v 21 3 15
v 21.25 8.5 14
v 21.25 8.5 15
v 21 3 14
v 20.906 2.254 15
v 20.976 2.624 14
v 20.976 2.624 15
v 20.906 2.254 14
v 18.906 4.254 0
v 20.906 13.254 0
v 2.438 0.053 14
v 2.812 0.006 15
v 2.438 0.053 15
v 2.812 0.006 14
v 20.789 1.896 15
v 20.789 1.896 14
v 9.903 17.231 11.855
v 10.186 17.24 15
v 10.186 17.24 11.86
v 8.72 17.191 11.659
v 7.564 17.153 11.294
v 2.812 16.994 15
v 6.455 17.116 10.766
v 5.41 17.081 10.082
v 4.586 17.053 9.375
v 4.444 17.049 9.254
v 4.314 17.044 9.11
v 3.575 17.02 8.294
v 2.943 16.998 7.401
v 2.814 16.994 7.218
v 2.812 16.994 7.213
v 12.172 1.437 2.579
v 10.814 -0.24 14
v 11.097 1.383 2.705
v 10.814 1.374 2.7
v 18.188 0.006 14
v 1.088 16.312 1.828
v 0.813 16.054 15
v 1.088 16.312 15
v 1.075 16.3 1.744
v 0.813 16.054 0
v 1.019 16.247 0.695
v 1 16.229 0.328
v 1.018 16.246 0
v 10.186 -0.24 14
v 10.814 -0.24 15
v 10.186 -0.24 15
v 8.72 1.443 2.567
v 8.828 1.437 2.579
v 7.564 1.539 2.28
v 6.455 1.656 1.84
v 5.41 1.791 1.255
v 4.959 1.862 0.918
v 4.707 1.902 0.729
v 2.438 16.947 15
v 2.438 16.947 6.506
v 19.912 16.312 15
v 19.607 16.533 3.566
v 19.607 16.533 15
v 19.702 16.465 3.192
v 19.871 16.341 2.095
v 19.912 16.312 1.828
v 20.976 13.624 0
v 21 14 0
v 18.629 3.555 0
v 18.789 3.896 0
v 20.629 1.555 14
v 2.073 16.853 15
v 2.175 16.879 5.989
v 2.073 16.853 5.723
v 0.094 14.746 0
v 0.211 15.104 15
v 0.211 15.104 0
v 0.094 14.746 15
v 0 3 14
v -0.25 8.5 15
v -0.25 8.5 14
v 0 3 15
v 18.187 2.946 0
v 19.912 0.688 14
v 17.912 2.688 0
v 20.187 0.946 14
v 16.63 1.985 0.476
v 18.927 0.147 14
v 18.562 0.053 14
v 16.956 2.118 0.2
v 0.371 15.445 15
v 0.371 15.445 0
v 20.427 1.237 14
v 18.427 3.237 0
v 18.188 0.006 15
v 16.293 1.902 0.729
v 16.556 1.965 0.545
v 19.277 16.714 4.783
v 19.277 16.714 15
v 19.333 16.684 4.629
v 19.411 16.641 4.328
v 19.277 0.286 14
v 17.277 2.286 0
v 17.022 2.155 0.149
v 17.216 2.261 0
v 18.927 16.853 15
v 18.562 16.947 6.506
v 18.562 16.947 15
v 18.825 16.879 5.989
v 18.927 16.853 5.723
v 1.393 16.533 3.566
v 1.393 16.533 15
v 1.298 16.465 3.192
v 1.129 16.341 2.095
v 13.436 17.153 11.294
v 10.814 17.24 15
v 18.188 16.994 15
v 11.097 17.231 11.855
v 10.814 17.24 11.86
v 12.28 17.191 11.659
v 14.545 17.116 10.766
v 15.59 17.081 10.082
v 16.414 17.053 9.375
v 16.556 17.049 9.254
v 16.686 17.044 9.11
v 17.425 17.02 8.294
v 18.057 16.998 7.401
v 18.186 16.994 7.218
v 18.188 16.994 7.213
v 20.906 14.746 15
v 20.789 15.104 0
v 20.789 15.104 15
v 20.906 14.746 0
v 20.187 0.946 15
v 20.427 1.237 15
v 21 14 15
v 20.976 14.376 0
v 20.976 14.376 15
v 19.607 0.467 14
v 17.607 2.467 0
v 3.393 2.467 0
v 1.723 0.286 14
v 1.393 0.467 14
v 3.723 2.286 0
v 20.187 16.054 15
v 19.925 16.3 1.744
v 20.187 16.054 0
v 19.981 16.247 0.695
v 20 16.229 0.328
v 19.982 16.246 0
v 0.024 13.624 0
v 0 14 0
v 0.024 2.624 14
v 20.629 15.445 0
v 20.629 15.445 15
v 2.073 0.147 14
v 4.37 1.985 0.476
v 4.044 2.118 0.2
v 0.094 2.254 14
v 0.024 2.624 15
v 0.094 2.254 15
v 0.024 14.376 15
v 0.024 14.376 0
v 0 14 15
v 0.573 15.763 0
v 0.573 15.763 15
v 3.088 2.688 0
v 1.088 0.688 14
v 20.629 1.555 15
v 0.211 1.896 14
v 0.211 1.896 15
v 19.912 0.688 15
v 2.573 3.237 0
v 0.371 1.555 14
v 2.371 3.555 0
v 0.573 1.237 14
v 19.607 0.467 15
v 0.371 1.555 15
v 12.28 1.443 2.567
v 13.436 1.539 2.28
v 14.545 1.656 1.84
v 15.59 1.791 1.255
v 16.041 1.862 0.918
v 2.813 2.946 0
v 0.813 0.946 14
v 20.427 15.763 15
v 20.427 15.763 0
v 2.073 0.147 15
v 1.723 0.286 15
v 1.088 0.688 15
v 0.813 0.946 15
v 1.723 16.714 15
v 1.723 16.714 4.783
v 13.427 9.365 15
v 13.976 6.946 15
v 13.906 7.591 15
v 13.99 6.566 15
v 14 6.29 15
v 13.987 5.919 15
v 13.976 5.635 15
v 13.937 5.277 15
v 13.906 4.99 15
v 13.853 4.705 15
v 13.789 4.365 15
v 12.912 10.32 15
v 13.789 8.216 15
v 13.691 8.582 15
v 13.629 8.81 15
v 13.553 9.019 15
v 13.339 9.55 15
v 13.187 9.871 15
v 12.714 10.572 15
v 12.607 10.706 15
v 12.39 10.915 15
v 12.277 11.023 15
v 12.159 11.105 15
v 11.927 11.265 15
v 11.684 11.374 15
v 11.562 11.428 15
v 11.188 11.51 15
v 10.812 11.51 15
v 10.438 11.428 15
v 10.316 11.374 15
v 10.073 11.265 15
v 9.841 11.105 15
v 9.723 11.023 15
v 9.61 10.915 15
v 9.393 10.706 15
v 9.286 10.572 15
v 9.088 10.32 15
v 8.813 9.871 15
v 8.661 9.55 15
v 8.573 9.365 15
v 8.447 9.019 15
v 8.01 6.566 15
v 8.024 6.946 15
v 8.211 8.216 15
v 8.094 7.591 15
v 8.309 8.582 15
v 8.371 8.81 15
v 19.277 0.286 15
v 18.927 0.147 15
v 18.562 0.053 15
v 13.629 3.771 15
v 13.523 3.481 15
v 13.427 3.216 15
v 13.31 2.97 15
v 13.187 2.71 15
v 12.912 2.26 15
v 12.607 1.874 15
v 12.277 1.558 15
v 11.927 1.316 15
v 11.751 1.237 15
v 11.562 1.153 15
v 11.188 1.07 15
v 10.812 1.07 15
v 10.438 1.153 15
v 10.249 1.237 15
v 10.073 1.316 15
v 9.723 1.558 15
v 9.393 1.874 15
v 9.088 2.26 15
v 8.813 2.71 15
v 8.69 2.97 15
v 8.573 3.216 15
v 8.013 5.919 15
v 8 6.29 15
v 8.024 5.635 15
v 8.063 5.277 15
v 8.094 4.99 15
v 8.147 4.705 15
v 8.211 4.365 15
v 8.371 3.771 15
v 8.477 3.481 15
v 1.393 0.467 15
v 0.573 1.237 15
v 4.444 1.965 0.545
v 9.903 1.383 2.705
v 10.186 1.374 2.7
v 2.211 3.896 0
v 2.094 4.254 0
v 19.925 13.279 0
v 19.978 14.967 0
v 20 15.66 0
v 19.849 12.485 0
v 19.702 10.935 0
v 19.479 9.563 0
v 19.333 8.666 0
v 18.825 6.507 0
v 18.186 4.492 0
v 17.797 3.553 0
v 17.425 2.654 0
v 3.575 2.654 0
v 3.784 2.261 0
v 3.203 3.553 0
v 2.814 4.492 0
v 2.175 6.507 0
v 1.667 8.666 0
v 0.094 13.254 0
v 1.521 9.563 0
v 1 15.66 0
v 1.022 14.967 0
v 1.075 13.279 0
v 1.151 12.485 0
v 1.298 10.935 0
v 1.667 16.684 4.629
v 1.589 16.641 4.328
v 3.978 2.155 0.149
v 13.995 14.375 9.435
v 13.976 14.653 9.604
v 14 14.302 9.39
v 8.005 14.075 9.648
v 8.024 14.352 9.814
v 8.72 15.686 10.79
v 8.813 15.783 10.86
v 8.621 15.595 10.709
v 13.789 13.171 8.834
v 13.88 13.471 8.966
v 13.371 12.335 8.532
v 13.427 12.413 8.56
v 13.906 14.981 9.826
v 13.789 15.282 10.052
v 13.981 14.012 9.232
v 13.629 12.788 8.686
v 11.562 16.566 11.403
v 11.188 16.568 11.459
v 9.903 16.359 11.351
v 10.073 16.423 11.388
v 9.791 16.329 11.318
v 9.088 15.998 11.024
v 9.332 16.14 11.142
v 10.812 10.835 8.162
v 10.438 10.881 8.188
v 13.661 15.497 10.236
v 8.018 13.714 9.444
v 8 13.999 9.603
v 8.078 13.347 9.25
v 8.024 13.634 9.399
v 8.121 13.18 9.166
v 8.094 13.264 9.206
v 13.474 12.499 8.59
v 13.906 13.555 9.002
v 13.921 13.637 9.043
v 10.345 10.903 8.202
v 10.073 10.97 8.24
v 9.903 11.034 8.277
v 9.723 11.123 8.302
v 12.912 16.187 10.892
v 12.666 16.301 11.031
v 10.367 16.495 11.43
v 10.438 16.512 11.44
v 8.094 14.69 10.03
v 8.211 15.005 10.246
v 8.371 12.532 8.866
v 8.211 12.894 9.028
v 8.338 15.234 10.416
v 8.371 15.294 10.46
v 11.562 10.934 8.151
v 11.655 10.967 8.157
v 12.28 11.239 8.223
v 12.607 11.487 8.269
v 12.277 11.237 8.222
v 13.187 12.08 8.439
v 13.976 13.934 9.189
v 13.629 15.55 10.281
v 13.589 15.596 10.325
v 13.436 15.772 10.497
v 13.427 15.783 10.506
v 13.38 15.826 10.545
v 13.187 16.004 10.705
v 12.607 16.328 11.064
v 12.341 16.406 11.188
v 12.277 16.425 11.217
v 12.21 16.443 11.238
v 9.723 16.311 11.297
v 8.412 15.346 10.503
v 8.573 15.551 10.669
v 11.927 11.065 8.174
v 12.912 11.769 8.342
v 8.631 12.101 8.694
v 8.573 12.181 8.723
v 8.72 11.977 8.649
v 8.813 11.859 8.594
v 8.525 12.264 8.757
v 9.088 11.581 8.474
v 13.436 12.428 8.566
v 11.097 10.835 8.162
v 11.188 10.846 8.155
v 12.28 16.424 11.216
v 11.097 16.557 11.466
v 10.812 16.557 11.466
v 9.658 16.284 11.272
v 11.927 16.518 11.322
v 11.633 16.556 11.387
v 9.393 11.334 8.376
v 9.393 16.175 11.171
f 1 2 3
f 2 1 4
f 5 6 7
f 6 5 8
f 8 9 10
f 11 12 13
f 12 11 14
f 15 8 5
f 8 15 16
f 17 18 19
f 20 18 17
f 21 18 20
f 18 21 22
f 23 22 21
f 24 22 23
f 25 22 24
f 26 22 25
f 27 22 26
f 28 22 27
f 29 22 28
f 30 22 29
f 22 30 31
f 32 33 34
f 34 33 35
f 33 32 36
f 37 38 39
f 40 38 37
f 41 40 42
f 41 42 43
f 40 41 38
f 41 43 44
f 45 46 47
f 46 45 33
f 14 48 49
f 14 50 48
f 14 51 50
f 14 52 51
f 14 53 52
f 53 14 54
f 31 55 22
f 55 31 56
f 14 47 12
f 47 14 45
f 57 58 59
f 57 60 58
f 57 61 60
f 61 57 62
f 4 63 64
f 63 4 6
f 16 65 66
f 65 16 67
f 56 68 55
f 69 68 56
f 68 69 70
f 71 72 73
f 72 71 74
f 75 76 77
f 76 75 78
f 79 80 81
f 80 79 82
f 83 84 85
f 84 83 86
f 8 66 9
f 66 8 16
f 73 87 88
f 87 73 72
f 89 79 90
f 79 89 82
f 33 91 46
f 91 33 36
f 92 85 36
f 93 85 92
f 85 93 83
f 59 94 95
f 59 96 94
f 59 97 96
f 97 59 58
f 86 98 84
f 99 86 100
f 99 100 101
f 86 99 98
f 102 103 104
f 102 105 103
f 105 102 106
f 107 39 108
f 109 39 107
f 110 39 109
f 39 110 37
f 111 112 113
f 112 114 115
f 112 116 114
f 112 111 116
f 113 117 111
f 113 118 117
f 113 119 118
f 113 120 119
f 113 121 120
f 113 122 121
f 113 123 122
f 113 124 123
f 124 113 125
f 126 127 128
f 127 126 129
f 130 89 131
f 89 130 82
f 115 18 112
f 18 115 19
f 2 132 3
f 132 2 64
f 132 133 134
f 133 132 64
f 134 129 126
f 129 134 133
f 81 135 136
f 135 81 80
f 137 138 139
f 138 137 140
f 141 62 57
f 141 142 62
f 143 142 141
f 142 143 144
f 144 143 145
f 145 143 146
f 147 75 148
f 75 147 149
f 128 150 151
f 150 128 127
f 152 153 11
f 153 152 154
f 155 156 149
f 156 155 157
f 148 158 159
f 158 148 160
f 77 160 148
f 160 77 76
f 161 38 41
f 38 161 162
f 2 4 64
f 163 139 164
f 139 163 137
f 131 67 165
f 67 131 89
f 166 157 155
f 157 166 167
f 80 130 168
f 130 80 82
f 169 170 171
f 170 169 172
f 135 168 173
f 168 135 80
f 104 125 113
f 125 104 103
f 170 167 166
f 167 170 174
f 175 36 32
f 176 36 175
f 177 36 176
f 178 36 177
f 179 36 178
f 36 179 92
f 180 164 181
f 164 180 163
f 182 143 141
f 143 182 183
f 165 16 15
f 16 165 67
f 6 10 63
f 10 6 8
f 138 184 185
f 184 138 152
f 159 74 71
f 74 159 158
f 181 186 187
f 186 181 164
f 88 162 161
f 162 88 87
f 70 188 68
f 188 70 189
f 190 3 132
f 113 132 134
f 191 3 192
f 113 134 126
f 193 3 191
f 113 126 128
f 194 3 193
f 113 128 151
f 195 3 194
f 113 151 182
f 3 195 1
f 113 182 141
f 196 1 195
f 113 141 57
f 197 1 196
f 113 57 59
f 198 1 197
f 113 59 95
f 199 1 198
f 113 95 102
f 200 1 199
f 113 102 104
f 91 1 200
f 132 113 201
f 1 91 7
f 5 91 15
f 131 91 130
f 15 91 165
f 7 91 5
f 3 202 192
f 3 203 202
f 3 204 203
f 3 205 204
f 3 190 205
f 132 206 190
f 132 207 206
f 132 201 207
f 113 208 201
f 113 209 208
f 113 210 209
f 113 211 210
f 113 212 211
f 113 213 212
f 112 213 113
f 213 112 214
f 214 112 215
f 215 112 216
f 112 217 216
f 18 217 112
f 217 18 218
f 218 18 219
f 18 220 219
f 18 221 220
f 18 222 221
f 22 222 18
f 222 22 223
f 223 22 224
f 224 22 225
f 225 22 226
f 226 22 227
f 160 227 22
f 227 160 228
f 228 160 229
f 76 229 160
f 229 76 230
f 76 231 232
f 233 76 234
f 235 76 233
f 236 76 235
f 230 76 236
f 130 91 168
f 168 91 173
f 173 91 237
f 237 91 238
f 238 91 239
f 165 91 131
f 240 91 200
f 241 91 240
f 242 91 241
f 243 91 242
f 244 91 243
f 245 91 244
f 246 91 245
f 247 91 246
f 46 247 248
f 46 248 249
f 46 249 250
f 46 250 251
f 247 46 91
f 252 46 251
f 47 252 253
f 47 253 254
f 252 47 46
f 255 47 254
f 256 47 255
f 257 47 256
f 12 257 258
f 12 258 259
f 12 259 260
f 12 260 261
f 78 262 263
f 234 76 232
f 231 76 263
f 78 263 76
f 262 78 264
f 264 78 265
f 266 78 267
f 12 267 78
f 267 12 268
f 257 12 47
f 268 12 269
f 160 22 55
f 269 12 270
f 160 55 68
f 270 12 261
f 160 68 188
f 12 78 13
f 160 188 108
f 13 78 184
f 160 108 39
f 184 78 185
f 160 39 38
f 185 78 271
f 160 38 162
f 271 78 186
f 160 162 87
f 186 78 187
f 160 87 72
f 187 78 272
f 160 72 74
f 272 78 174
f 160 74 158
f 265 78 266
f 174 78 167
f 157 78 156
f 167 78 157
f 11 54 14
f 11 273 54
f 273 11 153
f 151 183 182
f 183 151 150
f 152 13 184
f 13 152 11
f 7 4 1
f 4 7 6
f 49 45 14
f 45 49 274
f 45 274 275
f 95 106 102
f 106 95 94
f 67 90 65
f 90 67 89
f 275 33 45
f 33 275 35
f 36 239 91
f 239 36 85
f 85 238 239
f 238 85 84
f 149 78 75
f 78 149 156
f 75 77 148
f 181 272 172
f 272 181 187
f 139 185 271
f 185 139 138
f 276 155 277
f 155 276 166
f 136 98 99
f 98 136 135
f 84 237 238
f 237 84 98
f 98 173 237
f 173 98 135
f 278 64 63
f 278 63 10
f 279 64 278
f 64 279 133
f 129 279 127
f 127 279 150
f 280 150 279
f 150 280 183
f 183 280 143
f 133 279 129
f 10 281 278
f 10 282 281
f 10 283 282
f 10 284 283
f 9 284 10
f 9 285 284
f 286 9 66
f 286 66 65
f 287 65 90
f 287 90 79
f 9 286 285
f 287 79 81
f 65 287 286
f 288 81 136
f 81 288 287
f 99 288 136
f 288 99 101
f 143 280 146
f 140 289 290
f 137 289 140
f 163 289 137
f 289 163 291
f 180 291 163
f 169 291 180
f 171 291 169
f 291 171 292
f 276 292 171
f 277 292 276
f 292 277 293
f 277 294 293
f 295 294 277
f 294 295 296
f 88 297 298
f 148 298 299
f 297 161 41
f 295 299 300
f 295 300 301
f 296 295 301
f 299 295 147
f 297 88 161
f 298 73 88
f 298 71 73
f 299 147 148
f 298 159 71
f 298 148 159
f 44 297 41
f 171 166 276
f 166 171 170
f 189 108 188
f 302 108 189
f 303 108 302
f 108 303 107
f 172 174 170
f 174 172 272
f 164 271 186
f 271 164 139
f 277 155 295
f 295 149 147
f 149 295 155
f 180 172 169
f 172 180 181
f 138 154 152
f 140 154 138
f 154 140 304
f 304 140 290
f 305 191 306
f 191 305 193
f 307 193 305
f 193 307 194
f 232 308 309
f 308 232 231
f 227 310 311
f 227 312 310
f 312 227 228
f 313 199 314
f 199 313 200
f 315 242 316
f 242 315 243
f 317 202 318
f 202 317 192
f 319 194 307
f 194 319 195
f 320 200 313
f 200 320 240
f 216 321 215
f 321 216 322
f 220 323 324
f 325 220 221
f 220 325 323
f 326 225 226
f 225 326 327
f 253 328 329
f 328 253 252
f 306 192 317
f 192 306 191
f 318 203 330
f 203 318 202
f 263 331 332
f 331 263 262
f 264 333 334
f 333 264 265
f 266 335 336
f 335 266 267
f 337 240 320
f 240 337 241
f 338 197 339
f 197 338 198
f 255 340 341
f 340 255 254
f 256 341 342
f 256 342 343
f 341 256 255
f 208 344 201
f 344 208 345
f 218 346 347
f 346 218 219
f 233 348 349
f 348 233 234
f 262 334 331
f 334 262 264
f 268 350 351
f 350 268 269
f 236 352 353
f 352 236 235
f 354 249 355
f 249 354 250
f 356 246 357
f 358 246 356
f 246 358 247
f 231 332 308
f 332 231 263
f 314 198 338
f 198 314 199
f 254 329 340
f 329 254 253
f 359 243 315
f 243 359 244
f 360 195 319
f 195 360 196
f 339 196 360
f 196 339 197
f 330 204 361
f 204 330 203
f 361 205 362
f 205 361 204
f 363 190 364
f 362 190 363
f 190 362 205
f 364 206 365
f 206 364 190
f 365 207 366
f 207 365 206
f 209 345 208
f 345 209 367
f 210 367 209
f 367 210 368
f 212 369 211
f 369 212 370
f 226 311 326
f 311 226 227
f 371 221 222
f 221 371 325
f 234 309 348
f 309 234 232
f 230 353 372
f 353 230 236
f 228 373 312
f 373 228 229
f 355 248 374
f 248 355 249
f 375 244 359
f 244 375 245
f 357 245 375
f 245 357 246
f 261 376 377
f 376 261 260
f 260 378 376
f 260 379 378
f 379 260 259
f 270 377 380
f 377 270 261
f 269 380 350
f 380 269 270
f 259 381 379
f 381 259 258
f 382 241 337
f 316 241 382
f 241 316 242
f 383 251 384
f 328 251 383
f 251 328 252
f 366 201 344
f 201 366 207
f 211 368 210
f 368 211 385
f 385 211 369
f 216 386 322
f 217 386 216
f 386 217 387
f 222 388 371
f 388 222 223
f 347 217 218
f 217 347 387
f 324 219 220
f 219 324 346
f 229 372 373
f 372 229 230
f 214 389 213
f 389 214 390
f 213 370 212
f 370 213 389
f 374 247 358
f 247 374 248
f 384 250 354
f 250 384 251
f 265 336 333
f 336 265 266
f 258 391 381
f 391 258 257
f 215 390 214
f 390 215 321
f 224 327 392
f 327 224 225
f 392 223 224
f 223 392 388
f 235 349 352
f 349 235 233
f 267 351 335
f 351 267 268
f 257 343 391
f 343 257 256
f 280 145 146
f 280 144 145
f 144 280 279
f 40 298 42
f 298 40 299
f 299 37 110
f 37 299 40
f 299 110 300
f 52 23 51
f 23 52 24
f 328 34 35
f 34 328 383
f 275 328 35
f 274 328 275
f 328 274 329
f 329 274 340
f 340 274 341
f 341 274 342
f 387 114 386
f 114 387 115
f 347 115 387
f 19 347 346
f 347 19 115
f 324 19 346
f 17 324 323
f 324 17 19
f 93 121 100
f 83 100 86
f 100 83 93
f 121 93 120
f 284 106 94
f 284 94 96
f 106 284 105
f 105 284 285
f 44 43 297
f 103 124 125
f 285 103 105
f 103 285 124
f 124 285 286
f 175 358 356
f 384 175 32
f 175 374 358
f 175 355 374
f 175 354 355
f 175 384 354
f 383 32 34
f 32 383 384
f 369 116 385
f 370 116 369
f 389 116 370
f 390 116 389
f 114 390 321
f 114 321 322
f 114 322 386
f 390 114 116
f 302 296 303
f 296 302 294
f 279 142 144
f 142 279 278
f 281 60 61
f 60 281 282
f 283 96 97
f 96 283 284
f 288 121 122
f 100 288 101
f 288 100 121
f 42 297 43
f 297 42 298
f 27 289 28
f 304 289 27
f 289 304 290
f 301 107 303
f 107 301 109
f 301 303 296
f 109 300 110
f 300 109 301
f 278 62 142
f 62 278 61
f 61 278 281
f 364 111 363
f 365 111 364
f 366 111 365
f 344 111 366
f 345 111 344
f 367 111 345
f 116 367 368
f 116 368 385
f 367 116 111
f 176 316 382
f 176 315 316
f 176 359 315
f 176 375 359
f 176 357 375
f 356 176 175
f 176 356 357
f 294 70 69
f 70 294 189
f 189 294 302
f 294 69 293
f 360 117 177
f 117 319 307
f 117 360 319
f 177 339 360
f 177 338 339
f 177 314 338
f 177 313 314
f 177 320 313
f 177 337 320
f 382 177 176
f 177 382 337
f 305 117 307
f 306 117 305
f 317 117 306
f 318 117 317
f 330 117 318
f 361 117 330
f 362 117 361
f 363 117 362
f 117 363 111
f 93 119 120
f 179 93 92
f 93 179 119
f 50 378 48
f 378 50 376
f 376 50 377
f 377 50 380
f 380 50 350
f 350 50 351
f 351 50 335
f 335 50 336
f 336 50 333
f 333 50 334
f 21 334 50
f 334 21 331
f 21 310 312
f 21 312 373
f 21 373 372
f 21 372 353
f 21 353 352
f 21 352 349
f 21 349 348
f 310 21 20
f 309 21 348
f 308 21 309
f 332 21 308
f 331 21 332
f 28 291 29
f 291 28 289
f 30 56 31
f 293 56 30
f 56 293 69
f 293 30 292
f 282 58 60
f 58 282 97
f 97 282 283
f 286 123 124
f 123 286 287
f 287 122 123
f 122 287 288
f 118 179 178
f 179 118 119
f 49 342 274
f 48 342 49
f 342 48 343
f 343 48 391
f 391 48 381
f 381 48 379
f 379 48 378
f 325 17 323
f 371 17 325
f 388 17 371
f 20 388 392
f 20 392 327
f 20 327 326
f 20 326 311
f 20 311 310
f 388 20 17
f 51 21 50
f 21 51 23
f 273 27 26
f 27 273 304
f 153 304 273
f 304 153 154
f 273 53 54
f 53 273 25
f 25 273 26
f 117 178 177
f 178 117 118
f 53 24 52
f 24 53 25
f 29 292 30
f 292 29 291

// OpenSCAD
// crank brothers - ghost kato 
// internal dropper seatpost cable-routing adapter

insertWidth=21;
insertHeight=17;
insertDepth=15;

// bulge/curve in the middle of each side
insertBulgeRadius=5;
insertBulgeX=0.25; // left and right (relative to the bike seat post)
insertBulgeY=0.25; // top and bottom (relative to the bike seat post)

cableJacketOpeningDia=6;
cableJacketXOffset=11;
cableJacketYOffset=22;
cableJacketZOffset=4;
cableJacketXAngle=55;
cableJacketYAngle=0;

topOpeningOpeningDia=insertWidth-2;
topOpeningXOffset=insertWidth/2;
topOpeningYOffset=7;
topOpeningZOffset=-5;
topOpeningXAngle=-60;

innerBottomInset=2;  // how much the hole narrows across the bottom (bike-wise)
innerSideInset=2;

insertCornerRoundnessRadius=3;

$fn=50;


//  %bodyCrudeAttempt();
//  %cube([insertWidth,insertHeight,insertDepth]);  // for reference
difference() {
    bodyUsingHull();
    // cable thru-hole
    translate([cableJacketXOffset,cableJacketYOffset,cableJacketZOffset])
        rotate([cableJacketXAngle,cableJacketYAngle,0])
            cylinder(d=cableJacketOpeningDia, h=insertDepth*3);
    // top opening matching cut
    translate([topOpeningXOffset,topOpeningYOffset,topOpeningZOffset])
        rotate([topOpeningXAngle,0,0])
            translate([0,0,-insertDepth*3/2])
            cylinder(d=topOpeningOpeningDia, h=insertDepth*3);
    

}

module bodyUsingHull() {
    hull() {
        // corners
        // inner end of insert (against axes)
        // 0,0
        translate([insertCornerRoundnessRadius+innerSideInset,insertCornerRoundnessRadius+innerBottomInset,0])
            cylinder(r=insertCornerRoundnessRadius, h=1);
        // 0,y
        translate([insertCornerRoundnessRadius,insertHeight-insertCornerRoundnessRadius,0])
            cylinder(r=insertCornerRoundnessRadius, h=1);
        // x,0
        translate([insertWidth-insertCornerRoundnessRadius-innerSideInset,
                insertCornerRoundnessRadius+innerBottomInset,0])
            cylinder(r=insertCornerRoundnessRadius, h=1);
        // x,y
        translate([insertWidth-insertCornerRoundnessRadius,insertHeight-insertCornerRoundnessRadius,0])
            cylinder(r=insertCornerRoundnessRadius, h=1);

        // outer (facing) end of insert (+z / top of drawing)
        // 0,0
        translate([insertCornerRoundnessRadius,insertCornerRoundnessRadius,insertDepth-1])
            cylinder(r=insertCornerRoundnessRadius, h=1);
        // 0,y
        translate([insertCornerRoundnessRadius,insertHeight-insertCornerRoundnessRadius,insertDepth-1])
            cylinder(r=insertCornerRoundnessRadius, h=1);
        // x,0
        translate([insertWidth-insertCornerRoundnessRadius,insertCornerRoundnessRadius,insertDepth-1])
            cylinder(r=insertCornerRoundnessRadius, h=1);
        // x,y
        translate([insertWidth-insertCornerRoundnessRadius,insertHeight-insertCornerRoundnessRadius,insertDepth-1])
            cylinder(r=insertCornerRoundnessRadius, h=1);
        
        // bulges
        // inner end of insert (against axes)
        xCenter=insertWidth/2;
        yCenter=insertHeight/2;
        // x bottom
        translate([xCenter,insertBulgeRadius-insertBulgeY+innerBottomInset,0])
            cylinder(r=insertBulgeRadius, h=1);
        // x top
        translate([xCenter,insertHeight-insertBulgeRadius+insertBulgeY,0])
            cylinder(r=insertBulgeRadius, h=1);
        // y left
        translate([insertBulgeRadius-insertBulgeX+innerSideInset,yCenter,0])
            cylinder(r=insertBulgeRadius, h=1);
        // y right
        translate([insertWidth-insertBulgeRadius-innerSideInset+insertBulgeX,yCenter,0])
            cylinder(r=insertBulgeRadius, h=1);

        // outer (facing) end of insert (+z / top of drawing)
        // x bottom
        translate([xCenter,insertBulgeRadius-insertBulgeY,insertDepth-1])
            cylinder(r=insertBulgeRadius, h=1);
        // x top
        translate([xCenter,insertHeight-insertBulgeRadius+insertBulgeY,insertDepth-1])
            cylinder(r=insertBulgeRadius, h=1);
        // y left
        translate([insertBulgeRadius-insertBulgeX,yCenter,insertDepth-1])
            cylinder(r=insertBulgeRadius, h=1);
        // y right
        translate([insertWidth-insertBulgeRadius+insertBulgeX,yCenter,insertDepth-1])
            cylinder(r=insertBulgeRadius, h=1);
    }
    
}

module bodyCrudeAttempt() {
        translate([insertCornerRoundnessRadius,insertCornerRoundnessRadius,0]) {
        linear_extrude(height=insertDepth) {
            minkowski() {
                square([insertWidth-insertCornerRoundnessRadius*2,insertHeight-insertCornerRoundnessRadius*2]);
                circle(r=insertCornerRoundnessRadius);
            }
        }
    }
}
